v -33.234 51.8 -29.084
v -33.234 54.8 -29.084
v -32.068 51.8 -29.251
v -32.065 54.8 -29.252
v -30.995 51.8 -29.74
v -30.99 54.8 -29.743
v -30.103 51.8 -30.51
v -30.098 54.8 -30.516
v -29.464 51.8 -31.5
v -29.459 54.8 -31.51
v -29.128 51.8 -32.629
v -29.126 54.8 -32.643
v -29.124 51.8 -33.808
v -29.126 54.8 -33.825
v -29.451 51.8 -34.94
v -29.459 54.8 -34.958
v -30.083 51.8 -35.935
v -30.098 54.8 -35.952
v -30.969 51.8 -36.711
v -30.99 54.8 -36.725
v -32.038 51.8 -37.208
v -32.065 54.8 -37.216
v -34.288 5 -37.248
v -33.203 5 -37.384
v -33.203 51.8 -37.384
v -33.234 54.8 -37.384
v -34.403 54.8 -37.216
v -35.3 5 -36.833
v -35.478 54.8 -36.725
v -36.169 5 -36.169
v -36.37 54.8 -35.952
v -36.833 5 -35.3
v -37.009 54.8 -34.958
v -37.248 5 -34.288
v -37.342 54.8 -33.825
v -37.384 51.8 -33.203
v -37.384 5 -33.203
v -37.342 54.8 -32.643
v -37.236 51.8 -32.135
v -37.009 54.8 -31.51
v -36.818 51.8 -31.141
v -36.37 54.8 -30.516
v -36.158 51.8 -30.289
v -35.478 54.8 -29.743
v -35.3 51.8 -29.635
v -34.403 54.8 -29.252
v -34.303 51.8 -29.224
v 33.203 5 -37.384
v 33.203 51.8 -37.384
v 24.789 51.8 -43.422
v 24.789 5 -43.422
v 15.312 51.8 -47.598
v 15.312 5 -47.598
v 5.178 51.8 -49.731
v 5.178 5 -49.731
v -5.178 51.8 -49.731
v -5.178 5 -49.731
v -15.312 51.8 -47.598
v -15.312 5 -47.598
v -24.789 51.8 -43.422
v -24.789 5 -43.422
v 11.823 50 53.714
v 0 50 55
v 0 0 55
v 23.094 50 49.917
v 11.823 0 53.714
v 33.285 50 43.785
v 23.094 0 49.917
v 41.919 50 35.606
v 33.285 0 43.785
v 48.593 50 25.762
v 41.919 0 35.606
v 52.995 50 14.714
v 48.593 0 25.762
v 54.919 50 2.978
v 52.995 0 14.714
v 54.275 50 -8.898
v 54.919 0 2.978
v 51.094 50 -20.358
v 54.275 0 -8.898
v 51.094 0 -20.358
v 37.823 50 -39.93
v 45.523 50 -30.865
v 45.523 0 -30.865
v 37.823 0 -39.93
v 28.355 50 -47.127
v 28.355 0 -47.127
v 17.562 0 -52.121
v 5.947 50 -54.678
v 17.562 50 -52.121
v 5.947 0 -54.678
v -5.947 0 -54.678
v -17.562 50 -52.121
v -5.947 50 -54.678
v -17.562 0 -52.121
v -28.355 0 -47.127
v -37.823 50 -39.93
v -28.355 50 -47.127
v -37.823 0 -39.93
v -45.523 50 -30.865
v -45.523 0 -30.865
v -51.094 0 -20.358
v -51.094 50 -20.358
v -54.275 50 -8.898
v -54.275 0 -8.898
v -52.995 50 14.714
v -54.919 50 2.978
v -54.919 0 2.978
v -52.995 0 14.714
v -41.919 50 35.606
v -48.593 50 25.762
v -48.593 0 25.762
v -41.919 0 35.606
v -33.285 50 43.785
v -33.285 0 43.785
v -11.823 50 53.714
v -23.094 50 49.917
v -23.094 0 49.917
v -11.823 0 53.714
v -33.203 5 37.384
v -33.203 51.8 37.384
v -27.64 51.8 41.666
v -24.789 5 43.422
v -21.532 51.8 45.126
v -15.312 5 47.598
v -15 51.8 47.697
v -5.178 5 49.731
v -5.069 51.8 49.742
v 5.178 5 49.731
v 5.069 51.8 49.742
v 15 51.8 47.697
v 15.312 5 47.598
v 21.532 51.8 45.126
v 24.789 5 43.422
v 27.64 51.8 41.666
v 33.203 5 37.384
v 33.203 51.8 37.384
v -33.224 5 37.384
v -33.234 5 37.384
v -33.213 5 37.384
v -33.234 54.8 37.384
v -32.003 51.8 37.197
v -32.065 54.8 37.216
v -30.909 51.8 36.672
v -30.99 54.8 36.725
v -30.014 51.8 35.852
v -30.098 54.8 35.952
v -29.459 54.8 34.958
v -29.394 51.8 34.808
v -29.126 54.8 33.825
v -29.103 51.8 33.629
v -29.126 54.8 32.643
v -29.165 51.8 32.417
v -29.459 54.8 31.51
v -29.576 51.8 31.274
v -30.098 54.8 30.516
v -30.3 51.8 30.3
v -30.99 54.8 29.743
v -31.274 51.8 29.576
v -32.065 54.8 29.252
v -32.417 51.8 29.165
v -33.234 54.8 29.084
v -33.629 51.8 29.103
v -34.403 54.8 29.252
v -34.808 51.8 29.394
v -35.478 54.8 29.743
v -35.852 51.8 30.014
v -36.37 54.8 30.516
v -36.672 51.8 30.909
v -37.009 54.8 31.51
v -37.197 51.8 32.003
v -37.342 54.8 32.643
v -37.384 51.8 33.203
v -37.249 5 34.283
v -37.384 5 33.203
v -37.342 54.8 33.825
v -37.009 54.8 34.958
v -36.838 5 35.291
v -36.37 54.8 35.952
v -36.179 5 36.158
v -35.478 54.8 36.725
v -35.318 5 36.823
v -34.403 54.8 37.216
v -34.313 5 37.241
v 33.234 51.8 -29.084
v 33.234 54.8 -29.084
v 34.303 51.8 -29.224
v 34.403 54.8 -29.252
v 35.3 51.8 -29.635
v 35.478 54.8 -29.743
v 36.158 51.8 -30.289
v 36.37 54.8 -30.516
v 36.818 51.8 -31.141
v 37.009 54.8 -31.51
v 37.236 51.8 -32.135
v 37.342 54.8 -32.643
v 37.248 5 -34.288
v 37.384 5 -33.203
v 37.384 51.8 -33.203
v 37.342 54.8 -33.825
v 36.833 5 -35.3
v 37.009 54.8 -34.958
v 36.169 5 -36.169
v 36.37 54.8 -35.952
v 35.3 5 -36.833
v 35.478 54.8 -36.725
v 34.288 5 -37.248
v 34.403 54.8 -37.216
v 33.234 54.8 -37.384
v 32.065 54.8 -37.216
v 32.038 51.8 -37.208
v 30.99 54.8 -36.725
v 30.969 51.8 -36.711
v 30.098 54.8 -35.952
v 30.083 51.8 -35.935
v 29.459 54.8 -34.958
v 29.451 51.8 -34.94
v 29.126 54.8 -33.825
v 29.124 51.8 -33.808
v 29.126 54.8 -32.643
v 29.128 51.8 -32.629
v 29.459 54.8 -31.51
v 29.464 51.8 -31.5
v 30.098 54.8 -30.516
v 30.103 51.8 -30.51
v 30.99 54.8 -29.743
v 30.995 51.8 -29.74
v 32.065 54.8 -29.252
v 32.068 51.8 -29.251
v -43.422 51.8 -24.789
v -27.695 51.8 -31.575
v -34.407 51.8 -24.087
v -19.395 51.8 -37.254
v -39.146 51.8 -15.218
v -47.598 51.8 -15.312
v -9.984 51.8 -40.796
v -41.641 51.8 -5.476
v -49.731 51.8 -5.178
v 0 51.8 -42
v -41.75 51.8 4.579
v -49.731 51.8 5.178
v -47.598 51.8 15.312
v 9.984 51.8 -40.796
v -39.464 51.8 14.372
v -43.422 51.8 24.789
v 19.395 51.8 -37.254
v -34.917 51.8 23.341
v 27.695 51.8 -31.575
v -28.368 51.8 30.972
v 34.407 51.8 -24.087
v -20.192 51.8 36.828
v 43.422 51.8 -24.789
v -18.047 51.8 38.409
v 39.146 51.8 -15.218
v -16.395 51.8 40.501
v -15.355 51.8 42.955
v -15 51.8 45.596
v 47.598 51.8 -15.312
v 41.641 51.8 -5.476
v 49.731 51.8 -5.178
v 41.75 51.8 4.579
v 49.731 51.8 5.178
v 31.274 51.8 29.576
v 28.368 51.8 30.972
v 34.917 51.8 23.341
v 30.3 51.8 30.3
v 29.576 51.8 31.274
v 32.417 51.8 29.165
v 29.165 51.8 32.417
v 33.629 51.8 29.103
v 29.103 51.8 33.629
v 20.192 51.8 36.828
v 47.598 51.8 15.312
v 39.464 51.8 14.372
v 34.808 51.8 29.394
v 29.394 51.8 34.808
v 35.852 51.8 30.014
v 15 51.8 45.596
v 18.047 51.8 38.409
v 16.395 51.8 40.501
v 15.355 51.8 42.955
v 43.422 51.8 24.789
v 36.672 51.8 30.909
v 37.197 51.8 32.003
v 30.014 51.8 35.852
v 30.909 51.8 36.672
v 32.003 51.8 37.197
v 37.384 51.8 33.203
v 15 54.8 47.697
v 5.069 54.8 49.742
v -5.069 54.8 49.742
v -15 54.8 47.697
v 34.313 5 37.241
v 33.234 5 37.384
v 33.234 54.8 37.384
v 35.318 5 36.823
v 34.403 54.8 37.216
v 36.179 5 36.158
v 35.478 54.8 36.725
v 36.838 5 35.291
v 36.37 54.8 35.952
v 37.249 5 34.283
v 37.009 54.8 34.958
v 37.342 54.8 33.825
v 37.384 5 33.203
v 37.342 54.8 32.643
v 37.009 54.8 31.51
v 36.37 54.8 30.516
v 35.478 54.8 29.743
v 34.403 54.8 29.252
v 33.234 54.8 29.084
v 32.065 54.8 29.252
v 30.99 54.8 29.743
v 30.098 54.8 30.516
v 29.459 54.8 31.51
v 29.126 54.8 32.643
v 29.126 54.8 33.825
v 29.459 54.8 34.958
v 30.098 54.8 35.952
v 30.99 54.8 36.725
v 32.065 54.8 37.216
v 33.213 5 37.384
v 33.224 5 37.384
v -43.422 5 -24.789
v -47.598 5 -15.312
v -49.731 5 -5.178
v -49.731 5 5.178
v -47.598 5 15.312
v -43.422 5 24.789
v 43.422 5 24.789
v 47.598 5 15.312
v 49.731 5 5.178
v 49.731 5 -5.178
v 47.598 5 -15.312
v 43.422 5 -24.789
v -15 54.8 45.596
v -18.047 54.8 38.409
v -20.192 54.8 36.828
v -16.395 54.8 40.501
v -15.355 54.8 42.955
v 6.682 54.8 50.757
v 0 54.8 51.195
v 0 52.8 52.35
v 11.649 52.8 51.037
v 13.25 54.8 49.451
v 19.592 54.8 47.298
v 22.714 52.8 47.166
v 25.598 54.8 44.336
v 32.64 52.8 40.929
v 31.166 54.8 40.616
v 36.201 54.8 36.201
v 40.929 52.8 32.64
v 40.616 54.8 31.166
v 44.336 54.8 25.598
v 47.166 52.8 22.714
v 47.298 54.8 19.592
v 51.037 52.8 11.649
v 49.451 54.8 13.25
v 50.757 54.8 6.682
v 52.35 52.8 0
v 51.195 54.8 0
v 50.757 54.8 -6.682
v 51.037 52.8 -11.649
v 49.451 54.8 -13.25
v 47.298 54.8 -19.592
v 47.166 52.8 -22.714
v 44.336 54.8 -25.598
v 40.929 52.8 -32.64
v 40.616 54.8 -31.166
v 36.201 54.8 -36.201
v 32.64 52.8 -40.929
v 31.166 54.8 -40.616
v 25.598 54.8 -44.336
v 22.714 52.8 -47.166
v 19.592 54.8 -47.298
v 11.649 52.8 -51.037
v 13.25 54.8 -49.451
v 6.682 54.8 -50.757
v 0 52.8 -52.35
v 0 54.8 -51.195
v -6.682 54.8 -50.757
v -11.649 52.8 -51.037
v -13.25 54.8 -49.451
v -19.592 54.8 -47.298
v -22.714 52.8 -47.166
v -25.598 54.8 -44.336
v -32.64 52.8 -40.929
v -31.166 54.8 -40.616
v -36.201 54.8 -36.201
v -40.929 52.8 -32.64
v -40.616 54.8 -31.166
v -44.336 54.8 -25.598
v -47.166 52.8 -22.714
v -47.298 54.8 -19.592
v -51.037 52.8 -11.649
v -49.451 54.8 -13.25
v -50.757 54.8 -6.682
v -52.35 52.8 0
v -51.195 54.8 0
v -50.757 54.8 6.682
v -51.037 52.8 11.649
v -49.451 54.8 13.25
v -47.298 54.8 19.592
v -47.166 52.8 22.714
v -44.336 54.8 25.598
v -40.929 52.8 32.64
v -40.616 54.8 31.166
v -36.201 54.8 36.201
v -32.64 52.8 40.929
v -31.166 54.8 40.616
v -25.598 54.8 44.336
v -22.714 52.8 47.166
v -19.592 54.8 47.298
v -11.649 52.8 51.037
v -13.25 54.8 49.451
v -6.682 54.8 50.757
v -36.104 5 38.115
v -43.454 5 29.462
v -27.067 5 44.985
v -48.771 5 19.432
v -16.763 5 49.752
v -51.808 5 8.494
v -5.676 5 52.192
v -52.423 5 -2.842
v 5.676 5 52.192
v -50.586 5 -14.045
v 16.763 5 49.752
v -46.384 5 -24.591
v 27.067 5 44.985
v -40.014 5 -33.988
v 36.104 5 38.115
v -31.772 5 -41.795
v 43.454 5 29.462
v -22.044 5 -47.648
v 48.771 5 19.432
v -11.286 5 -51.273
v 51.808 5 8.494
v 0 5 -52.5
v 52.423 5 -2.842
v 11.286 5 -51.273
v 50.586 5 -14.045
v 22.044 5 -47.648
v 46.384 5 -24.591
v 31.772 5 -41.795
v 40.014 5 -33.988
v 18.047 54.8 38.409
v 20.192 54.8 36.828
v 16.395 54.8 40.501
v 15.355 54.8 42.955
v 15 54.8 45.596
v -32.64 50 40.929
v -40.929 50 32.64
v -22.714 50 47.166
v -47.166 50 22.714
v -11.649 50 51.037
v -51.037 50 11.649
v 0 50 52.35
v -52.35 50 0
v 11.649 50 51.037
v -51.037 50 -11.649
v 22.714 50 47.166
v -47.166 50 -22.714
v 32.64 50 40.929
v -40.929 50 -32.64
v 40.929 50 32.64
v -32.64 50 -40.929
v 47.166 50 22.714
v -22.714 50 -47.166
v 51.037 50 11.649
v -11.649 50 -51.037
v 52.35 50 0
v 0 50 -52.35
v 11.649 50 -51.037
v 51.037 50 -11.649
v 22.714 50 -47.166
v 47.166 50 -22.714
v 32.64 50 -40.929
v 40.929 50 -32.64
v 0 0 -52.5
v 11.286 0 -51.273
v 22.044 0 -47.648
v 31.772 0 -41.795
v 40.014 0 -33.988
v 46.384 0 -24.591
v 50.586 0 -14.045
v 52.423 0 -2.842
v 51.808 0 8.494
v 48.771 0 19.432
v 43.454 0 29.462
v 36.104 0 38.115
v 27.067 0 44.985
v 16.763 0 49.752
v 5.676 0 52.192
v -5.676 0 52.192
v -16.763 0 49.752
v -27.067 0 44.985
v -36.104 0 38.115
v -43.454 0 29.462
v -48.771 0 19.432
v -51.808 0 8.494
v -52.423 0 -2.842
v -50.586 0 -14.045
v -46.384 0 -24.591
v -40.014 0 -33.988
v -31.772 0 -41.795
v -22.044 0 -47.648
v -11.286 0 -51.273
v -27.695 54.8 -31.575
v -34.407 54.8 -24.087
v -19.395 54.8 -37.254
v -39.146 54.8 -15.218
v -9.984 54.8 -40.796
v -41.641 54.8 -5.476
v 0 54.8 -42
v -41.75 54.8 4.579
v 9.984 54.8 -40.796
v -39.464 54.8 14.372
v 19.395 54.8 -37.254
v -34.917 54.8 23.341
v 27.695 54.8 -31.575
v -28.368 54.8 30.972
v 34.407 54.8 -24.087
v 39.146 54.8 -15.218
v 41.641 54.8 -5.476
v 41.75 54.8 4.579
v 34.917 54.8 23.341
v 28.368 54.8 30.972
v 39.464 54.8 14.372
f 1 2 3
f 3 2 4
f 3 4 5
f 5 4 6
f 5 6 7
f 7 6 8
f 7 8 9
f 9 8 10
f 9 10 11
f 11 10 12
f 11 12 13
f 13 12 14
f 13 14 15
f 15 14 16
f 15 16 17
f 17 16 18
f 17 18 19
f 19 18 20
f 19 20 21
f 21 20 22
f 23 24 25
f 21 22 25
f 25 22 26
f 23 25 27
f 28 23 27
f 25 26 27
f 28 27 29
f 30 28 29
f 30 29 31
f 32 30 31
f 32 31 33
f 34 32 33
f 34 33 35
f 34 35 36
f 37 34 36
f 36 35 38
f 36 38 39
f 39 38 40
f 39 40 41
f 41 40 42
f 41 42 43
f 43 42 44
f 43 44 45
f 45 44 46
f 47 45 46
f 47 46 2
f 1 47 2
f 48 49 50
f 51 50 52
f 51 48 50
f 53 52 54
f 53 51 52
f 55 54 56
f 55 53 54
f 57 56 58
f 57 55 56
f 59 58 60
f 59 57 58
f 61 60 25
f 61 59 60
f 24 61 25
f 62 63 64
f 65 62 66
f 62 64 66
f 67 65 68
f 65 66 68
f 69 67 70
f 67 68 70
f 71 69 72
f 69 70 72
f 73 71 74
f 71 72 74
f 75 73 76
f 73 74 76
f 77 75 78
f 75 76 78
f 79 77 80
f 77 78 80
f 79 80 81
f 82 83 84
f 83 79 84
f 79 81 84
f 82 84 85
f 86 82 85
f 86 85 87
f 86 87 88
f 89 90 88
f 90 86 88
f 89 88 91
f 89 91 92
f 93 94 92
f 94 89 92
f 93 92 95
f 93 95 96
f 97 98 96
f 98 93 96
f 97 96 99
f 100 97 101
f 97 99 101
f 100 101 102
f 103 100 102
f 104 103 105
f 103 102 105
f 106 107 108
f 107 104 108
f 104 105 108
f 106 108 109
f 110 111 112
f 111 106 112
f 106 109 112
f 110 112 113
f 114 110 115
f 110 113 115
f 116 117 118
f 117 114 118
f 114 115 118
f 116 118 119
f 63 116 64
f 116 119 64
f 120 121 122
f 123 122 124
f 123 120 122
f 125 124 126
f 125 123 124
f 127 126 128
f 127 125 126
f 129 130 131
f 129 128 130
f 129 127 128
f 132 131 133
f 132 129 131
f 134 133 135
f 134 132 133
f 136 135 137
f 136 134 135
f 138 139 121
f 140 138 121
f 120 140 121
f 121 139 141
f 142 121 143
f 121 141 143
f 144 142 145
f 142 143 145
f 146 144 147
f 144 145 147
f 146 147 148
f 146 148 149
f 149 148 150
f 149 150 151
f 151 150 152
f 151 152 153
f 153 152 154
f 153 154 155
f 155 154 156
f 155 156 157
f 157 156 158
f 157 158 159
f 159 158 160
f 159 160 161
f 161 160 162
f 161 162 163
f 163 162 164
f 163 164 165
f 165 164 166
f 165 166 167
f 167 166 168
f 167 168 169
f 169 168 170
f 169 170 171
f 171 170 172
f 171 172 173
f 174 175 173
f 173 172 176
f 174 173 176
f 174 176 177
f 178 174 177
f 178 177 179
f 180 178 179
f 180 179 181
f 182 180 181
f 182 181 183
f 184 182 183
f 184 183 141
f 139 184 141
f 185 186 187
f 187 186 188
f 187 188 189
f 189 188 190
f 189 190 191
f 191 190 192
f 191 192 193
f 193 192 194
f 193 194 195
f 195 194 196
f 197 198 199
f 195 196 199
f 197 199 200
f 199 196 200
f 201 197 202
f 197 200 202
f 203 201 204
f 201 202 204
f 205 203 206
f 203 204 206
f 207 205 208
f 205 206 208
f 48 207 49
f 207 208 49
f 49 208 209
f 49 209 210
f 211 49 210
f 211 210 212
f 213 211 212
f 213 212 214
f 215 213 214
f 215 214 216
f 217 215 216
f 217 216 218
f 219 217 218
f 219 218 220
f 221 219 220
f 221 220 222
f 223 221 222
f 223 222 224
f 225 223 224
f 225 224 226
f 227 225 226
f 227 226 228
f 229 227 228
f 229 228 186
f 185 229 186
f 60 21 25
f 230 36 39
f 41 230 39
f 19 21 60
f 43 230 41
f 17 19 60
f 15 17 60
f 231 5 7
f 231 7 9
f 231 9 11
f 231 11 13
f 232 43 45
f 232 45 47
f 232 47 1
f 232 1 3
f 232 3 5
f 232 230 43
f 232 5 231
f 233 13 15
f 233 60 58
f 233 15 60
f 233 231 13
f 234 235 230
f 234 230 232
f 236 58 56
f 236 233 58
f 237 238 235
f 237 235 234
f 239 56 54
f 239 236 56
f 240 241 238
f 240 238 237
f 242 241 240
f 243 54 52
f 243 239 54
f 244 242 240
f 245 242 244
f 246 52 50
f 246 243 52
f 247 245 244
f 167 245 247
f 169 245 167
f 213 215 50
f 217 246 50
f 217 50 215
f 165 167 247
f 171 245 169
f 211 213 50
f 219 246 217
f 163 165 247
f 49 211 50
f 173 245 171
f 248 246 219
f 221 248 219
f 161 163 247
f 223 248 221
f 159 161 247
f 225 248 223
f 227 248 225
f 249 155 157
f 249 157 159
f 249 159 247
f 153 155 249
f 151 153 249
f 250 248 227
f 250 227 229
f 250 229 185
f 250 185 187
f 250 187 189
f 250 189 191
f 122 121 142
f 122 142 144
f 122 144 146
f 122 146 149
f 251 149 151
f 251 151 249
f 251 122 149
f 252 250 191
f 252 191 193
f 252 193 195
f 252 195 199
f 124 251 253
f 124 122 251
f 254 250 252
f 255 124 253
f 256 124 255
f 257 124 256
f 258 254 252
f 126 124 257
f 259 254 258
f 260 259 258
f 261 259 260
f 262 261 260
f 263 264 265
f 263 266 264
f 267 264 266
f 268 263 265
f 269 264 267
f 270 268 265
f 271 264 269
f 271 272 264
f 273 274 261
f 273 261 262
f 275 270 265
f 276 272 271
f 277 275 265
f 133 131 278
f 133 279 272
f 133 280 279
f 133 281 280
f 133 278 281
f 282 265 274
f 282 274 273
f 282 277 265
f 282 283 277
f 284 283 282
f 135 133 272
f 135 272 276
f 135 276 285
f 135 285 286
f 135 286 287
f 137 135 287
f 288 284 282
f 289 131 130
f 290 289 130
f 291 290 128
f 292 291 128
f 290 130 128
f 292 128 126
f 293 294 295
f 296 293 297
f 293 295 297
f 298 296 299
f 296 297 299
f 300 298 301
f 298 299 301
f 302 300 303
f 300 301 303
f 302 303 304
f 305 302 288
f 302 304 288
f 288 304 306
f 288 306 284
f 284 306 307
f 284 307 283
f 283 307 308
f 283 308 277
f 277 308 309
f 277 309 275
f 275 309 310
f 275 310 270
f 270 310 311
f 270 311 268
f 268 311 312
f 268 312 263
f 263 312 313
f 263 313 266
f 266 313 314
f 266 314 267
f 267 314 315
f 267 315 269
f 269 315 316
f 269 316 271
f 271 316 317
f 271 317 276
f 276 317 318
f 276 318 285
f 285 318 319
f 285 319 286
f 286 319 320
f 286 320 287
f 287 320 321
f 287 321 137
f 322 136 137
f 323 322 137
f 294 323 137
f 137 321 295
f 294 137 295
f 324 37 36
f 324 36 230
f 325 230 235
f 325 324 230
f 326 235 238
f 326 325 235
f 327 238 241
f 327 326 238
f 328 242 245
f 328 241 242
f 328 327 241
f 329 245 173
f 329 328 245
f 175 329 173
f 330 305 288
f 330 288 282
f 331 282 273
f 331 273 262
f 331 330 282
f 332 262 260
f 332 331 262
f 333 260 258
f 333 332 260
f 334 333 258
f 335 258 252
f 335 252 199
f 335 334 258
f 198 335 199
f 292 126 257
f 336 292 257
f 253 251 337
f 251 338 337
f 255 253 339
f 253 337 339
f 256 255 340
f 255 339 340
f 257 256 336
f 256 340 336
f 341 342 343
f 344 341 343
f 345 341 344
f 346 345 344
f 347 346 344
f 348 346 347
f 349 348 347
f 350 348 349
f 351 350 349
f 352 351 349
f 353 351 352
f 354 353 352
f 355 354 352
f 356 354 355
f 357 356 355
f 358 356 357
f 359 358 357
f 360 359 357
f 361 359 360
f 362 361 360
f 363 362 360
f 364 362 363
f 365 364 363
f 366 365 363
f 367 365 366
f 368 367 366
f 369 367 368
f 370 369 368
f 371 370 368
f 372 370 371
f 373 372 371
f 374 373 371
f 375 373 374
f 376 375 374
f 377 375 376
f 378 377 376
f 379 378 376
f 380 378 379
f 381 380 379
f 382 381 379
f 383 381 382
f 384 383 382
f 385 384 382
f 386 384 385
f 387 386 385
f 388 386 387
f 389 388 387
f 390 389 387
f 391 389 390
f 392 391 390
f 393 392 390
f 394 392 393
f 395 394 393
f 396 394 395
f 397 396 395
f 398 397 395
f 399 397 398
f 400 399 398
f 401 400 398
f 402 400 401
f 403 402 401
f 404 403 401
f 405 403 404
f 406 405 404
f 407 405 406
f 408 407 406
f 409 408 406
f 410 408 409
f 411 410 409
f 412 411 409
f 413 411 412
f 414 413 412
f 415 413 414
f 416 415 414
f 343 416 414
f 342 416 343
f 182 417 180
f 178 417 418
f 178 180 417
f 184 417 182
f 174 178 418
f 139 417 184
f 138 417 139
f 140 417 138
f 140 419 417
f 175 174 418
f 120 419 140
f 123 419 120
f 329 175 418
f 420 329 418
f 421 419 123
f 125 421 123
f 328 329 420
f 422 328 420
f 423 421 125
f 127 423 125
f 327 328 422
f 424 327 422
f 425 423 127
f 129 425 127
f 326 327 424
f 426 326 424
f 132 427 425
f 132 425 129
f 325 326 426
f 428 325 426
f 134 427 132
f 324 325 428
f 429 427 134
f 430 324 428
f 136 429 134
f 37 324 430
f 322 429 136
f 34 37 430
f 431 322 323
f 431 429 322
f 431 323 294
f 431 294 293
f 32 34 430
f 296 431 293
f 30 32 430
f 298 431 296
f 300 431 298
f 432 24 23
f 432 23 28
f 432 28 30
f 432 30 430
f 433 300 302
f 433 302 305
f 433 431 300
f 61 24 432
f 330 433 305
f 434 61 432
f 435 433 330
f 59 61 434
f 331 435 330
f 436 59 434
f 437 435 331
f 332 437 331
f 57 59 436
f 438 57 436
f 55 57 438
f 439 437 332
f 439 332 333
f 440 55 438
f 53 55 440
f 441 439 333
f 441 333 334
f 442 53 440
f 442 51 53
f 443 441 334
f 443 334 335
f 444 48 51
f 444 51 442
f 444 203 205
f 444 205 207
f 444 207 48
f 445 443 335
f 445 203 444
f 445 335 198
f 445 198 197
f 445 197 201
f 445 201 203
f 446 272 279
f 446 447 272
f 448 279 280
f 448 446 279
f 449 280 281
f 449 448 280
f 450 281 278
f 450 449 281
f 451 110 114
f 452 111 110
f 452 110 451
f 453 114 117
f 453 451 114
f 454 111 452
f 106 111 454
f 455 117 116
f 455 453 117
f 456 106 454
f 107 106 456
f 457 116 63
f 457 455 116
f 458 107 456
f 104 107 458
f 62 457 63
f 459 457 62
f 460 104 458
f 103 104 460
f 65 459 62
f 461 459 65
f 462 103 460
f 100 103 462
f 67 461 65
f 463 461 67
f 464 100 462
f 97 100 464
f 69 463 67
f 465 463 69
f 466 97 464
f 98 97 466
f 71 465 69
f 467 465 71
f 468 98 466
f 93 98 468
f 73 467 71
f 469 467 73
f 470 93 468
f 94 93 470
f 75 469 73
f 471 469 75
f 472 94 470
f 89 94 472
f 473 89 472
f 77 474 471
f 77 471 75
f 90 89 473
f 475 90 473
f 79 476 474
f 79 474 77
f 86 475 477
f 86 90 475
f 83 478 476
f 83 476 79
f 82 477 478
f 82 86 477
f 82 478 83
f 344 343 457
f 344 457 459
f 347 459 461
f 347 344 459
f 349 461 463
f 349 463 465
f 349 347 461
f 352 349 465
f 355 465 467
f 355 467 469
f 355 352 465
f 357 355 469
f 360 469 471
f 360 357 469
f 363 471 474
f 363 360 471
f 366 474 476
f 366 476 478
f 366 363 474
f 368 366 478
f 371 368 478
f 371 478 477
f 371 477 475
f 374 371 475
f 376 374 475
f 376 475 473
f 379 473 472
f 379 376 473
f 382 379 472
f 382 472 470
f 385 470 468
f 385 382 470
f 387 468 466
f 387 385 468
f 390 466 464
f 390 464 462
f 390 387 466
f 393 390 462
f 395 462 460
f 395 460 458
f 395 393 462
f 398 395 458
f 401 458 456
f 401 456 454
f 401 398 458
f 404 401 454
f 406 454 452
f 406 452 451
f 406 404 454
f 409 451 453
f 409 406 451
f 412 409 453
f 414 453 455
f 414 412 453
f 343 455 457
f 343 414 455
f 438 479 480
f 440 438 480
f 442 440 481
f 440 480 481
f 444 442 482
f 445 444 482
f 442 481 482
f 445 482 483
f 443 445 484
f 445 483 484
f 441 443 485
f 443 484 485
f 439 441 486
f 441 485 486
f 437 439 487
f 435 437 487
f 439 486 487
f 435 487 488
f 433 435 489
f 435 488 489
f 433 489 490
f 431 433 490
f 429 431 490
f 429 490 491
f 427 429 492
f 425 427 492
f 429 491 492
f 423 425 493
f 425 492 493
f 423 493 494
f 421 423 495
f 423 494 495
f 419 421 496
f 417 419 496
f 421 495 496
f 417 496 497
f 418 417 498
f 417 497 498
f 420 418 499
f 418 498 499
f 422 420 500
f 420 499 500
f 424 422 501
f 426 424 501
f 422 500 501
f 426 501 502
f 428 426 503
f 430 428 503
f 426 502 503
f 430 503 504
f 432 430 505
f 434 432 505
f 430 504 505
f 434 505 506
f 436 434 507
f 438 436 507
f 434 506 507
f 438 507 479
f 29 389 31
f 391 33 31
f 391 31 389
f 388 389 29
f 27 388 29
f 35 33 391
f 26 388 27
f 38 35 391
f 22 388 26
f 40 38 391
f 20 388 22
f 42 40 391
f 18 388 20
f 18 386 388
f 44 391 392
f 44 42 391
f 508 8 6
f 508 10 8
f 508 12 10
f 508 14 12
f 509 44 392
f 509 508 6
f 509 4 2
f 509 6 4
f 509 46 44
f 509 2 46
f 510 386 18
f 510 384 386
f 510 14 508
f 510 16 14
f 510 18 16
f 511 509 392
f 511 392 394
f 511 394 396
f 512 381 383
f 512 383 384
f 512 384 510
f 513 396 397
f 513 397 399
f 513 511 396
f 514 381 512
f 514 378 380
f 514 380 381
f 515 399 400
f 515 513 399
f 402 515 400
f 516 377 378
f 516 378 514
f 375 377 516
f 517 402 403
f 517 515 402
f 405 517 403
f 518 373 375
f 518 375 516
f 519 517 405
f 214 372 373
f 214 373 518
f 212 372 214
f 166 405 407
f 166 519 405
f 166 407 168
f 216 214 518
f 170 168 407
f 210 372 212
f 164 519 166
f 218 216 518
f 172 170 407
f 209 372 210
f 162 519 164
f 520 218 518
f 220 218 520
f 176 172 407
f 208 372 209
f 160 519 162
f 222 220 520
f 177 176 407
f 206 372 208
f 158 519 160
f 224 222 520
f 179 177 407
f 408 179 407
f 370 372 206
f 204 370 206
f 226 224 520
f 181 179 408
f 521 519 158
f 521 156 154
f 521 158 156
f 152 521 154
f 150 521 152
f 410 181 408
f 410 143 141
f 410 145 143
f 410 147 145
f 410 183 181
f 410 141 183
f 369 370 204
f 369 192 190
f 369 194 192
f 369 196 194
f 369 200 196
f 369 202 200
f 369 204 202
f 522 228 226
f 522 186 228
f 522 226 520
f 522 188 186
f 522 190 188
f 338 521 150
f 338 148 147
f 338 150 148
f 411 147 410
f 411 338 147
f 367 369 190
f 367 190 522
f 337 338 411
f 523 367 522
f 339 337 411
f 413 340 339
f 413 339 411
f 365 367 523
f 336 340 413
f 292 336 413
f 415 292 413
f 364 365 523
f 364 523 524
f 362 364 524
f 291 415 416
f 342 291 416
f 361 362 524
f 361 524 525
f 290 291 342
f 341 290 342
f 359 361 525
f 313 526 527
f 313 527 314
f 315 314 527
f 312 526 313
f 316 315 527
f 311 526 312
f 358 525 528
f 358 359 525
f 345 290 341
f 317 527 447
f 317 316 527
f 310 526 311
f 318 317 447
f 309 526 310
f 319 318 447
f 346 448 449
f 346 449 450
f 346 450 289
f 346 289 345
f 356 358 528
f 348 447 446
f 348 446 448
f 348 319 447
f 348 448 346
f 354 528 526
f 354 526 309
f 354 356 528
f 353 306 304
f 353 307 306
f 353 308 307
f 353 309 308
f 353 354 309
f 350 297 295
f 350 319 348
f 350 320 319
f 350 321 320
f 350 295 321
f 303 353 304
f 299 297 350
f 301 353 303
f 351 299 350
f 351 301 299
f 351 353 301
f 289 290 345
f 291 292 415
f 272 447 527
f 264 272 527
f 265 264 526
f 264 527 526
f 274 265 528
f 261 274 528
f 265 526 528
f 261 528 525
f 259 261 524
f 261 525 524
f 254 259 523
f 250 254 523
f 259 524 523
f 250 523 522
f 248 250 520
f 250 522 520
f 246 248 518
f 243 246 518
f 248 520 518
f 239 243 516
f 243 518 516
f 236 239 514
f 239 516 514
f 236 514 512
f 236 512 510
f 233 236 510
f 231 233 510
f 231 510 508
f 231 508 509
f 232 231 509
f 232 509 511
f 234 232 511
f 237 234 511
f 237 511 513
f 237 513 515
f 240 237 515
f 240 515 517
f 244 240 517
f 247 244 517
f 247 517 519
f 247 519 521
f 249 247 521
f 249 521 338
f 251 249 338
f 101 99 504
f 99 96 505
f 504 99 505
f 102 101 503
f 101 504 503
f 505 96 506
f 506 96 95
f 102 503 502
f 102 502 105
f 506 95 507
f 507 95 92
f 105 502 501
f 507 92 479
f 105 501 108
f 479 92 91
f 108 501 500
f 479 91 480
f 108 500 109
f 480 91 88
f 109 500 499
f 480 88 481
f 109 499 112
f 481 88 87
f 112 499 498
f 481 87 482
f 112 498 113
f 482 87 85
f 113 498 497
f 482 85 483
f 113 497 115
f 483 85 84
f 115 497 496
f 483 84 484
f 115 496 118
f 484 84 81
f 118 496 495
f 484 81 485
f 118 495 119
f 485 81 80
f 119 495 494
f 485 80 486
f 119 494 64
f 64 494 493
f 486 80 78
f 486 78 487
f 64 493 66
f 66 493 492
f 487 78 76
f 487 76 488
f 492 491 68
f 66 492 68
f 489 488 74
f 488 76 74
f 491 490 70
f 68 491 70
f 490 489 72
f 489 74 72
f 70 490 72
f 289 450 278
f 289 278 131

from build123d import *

# Parameters (mm, degrees)
SKETCH1_R           = 55
BOSS_EXTRUDE1_DEPTH = 54.8
SHELL1_T            = -5
SKETCH2_R           = 35
CUT_EXTRUDE1_DEPTH  = 6
SKETCH3_R           = 42
CUT_EXTRUDE2_DEPTH  = 55.8
SKETCH4_R           = 4.15
CUT_EXTRUDE3_DEPTH  = 55.8
SKETCH6_R           = 50
CUT_EXTRUDE4_DEPTH  = 2
CUT_EXTRUDE5_DEPTH  = 4
FILLET1_R           = 10
SKETCH8_OUTSIDE_W   = 144.986
SKETCH8_OUTSIDE_H   = 144.986
SKETCH8_OUTSIDE_R   = 52.35
CUT_EXTRUDE6_DEPTH  = 4.8
CHAMFER1_SIZE       = 2
CHAMFER1_SIZE2      = 1.154700538
SKETCH9_R           = 52.5
CUT_EXTRUDE7_DEPTH  = 5


with BuildPart() as part:
    # Sketch1 → Boss-Extrude1 (new body)
    with BuildSketch(Plane(origin=(0, 0, 0), x_dir=(1, 0, 0), z_dir=(0, 1, 0))):
        with Locations(Location((0, 0, 0), (0, 0, 270))):  # turned: the seam where the file's is
            Circle(SKETCH1_R)
    extrude(amount=BOSS_EXTRUDE1_DEPTH)

    # Shell1
    shell1_openings = [part.faces().sort_by_distance(p)[0] for p in [
        (0, 0, 0),
    ]]
    offset(amount=SHELL1_T, openings=shell1_openings, kind=Kind.INTERSECTION)

    # Sketch2 → Cut-Extrude1 (cut, through all)
    with BuildSketch(Plane.XZ.offset(-49.8)):
        with Locations(Location((0, 0, 0), (0, 0, 270))):  # turned: the seam where the file's is
            Circle(SKETCH2_R)
    extrude(amount=-CUT_EXTRUDE1_DEPTH, mode=Mode.SUBTRACT)

    # Sketch3 → Cut-Extrude2 (cut, through all)
    with BuildSketch(Plane(origin=(0, 54.8, 0), x_dir=(1, 0, 0), z_dir=(0, 1, 0))):
        with Locations(Location((0, 0, 0), (0, 0, 270))):  # turned: the seam where the file's is
            Circle(SKETCH3_R)
    extrude(amount=-CUT_EXTRUDE2_DEPTH, mode=Mode.SUBTRACT)

    # Sketch4 → Cut-Extrude3 (cut, through all)
    with BuildSketch(Plane(origin=(0, 54.8, 0), x_dir=(1, 0, 0), z_dir=(0, 1, 0))):
        with Locations(Location((-33.234018716, -33.234018716, 0), (0, 0, 270))):  # turned: the seam where the file's is
            Circle(SKETCH4_R)
        with Locations(Location((-33.234018716, 33.234018716, 0), (0, 0, 270))):  # turned: the seam where the file's is
            Circle(SKETCH4_R)
        with Locations(Location((33.234018716, 33.234018716, 0), (0, 0, 270))):  # turned: the seam where the file's is
            Circle(SKETCH4_R)
        with Locations(Location((33.234018716, -33.234018716, 0), (0, 0, 270))):  # turned: the seam where the file's is
            Circle(SKETCH4_R)
    extrude(amount=-CUT_EXTRUDE3_DEPTH, mode=Mode.SUBTRACT)

    # Sketch6 → Cut-Extrude4 (cut)
    with BuildSketch(Plane.XZ.offset(-49.8)):
        Circle(SKETCH6_R)
    extrude(amount=-CUT_EXTRUDE4_DEPTH, mode=Mode.SUBTRACT)

    # Sketch7 → Cut-Extrude5 (cut, through all)
    with BuildSketch(Plane.XZ.offset(-51.8)):
        with BuildLine():
            Line((15, 33.234018716), (15, 47.696960071))
            ThreePointArc((15, 47.696960071), (0, 50), (-15, 47.696960071))
            Line((-15, 47.696960071), (-15, 33.234018716))
            Line((-15, 33.234018716), (15, 33.234018716))
        make_face()
    extrude(amount=-CUT_EXTRUDE5_DEPTH, mode=Mode.SUBTRACT)

    # Fillet1
    fillet1_edges = [part.edges().sort_by_distance(p)[0] for p in [
        (-15, 53.3, 39.230090492),
        (15, 53.3, 39.230090492),
    ]]
    fillet(fillet1_edges, radius=FILLET1_R)

    # Sketch8 outside → Cut-Extrude6 (cut)
    with BuildSketch(Plane(origin=(0, 54.8, 0), x_dir=(1, 0, 0), z_dir=(0, 1, 0))):
        Rectangle(SKETCH8_OUTSIDE_W, SKETCH8_OUTSIDE_H)
        with Locations(Location((0, 0, 0), (0, 0, 270))):  # turned: the seam where the file's is
            Circle(SKETCH8_OUTSIDE_R, mode=Mode.SUBTRACT)
    extrude(amount=-CUT_EXTRUDE6_DEPTH, mode=Mode.SUBTRACT)

    # Chamfer1
    chamfer1_edges = [part.edges().sort_by_distance(p)[0] for p in [
        (0, 54.8, -52.35),
    ]]
    chamfer1_side = [part.faces().sort_by_distance(p)[0] for p in [
        (0, 52.4, -52.35),
    ]]
    chamfer(chamfer1_edges, length=CHAMFER1_SIZE, length2=CHAMFER1_SIZE2, reference=chamfer1_side[0])

    # Sketch9 → Cut-Extrude7 (cut)
    with BuildSketch(Plane.XZ):
        with Locations(Location((0, 0, 0), (0, 0, 270))):  # turned: the seam where the file's is
            Circle(SKETCH9_R)
    extrude(amount=-CUT_EXTRUDE7_DEPTH, mode=Mode.SUBTRACT)


solid = part.part
